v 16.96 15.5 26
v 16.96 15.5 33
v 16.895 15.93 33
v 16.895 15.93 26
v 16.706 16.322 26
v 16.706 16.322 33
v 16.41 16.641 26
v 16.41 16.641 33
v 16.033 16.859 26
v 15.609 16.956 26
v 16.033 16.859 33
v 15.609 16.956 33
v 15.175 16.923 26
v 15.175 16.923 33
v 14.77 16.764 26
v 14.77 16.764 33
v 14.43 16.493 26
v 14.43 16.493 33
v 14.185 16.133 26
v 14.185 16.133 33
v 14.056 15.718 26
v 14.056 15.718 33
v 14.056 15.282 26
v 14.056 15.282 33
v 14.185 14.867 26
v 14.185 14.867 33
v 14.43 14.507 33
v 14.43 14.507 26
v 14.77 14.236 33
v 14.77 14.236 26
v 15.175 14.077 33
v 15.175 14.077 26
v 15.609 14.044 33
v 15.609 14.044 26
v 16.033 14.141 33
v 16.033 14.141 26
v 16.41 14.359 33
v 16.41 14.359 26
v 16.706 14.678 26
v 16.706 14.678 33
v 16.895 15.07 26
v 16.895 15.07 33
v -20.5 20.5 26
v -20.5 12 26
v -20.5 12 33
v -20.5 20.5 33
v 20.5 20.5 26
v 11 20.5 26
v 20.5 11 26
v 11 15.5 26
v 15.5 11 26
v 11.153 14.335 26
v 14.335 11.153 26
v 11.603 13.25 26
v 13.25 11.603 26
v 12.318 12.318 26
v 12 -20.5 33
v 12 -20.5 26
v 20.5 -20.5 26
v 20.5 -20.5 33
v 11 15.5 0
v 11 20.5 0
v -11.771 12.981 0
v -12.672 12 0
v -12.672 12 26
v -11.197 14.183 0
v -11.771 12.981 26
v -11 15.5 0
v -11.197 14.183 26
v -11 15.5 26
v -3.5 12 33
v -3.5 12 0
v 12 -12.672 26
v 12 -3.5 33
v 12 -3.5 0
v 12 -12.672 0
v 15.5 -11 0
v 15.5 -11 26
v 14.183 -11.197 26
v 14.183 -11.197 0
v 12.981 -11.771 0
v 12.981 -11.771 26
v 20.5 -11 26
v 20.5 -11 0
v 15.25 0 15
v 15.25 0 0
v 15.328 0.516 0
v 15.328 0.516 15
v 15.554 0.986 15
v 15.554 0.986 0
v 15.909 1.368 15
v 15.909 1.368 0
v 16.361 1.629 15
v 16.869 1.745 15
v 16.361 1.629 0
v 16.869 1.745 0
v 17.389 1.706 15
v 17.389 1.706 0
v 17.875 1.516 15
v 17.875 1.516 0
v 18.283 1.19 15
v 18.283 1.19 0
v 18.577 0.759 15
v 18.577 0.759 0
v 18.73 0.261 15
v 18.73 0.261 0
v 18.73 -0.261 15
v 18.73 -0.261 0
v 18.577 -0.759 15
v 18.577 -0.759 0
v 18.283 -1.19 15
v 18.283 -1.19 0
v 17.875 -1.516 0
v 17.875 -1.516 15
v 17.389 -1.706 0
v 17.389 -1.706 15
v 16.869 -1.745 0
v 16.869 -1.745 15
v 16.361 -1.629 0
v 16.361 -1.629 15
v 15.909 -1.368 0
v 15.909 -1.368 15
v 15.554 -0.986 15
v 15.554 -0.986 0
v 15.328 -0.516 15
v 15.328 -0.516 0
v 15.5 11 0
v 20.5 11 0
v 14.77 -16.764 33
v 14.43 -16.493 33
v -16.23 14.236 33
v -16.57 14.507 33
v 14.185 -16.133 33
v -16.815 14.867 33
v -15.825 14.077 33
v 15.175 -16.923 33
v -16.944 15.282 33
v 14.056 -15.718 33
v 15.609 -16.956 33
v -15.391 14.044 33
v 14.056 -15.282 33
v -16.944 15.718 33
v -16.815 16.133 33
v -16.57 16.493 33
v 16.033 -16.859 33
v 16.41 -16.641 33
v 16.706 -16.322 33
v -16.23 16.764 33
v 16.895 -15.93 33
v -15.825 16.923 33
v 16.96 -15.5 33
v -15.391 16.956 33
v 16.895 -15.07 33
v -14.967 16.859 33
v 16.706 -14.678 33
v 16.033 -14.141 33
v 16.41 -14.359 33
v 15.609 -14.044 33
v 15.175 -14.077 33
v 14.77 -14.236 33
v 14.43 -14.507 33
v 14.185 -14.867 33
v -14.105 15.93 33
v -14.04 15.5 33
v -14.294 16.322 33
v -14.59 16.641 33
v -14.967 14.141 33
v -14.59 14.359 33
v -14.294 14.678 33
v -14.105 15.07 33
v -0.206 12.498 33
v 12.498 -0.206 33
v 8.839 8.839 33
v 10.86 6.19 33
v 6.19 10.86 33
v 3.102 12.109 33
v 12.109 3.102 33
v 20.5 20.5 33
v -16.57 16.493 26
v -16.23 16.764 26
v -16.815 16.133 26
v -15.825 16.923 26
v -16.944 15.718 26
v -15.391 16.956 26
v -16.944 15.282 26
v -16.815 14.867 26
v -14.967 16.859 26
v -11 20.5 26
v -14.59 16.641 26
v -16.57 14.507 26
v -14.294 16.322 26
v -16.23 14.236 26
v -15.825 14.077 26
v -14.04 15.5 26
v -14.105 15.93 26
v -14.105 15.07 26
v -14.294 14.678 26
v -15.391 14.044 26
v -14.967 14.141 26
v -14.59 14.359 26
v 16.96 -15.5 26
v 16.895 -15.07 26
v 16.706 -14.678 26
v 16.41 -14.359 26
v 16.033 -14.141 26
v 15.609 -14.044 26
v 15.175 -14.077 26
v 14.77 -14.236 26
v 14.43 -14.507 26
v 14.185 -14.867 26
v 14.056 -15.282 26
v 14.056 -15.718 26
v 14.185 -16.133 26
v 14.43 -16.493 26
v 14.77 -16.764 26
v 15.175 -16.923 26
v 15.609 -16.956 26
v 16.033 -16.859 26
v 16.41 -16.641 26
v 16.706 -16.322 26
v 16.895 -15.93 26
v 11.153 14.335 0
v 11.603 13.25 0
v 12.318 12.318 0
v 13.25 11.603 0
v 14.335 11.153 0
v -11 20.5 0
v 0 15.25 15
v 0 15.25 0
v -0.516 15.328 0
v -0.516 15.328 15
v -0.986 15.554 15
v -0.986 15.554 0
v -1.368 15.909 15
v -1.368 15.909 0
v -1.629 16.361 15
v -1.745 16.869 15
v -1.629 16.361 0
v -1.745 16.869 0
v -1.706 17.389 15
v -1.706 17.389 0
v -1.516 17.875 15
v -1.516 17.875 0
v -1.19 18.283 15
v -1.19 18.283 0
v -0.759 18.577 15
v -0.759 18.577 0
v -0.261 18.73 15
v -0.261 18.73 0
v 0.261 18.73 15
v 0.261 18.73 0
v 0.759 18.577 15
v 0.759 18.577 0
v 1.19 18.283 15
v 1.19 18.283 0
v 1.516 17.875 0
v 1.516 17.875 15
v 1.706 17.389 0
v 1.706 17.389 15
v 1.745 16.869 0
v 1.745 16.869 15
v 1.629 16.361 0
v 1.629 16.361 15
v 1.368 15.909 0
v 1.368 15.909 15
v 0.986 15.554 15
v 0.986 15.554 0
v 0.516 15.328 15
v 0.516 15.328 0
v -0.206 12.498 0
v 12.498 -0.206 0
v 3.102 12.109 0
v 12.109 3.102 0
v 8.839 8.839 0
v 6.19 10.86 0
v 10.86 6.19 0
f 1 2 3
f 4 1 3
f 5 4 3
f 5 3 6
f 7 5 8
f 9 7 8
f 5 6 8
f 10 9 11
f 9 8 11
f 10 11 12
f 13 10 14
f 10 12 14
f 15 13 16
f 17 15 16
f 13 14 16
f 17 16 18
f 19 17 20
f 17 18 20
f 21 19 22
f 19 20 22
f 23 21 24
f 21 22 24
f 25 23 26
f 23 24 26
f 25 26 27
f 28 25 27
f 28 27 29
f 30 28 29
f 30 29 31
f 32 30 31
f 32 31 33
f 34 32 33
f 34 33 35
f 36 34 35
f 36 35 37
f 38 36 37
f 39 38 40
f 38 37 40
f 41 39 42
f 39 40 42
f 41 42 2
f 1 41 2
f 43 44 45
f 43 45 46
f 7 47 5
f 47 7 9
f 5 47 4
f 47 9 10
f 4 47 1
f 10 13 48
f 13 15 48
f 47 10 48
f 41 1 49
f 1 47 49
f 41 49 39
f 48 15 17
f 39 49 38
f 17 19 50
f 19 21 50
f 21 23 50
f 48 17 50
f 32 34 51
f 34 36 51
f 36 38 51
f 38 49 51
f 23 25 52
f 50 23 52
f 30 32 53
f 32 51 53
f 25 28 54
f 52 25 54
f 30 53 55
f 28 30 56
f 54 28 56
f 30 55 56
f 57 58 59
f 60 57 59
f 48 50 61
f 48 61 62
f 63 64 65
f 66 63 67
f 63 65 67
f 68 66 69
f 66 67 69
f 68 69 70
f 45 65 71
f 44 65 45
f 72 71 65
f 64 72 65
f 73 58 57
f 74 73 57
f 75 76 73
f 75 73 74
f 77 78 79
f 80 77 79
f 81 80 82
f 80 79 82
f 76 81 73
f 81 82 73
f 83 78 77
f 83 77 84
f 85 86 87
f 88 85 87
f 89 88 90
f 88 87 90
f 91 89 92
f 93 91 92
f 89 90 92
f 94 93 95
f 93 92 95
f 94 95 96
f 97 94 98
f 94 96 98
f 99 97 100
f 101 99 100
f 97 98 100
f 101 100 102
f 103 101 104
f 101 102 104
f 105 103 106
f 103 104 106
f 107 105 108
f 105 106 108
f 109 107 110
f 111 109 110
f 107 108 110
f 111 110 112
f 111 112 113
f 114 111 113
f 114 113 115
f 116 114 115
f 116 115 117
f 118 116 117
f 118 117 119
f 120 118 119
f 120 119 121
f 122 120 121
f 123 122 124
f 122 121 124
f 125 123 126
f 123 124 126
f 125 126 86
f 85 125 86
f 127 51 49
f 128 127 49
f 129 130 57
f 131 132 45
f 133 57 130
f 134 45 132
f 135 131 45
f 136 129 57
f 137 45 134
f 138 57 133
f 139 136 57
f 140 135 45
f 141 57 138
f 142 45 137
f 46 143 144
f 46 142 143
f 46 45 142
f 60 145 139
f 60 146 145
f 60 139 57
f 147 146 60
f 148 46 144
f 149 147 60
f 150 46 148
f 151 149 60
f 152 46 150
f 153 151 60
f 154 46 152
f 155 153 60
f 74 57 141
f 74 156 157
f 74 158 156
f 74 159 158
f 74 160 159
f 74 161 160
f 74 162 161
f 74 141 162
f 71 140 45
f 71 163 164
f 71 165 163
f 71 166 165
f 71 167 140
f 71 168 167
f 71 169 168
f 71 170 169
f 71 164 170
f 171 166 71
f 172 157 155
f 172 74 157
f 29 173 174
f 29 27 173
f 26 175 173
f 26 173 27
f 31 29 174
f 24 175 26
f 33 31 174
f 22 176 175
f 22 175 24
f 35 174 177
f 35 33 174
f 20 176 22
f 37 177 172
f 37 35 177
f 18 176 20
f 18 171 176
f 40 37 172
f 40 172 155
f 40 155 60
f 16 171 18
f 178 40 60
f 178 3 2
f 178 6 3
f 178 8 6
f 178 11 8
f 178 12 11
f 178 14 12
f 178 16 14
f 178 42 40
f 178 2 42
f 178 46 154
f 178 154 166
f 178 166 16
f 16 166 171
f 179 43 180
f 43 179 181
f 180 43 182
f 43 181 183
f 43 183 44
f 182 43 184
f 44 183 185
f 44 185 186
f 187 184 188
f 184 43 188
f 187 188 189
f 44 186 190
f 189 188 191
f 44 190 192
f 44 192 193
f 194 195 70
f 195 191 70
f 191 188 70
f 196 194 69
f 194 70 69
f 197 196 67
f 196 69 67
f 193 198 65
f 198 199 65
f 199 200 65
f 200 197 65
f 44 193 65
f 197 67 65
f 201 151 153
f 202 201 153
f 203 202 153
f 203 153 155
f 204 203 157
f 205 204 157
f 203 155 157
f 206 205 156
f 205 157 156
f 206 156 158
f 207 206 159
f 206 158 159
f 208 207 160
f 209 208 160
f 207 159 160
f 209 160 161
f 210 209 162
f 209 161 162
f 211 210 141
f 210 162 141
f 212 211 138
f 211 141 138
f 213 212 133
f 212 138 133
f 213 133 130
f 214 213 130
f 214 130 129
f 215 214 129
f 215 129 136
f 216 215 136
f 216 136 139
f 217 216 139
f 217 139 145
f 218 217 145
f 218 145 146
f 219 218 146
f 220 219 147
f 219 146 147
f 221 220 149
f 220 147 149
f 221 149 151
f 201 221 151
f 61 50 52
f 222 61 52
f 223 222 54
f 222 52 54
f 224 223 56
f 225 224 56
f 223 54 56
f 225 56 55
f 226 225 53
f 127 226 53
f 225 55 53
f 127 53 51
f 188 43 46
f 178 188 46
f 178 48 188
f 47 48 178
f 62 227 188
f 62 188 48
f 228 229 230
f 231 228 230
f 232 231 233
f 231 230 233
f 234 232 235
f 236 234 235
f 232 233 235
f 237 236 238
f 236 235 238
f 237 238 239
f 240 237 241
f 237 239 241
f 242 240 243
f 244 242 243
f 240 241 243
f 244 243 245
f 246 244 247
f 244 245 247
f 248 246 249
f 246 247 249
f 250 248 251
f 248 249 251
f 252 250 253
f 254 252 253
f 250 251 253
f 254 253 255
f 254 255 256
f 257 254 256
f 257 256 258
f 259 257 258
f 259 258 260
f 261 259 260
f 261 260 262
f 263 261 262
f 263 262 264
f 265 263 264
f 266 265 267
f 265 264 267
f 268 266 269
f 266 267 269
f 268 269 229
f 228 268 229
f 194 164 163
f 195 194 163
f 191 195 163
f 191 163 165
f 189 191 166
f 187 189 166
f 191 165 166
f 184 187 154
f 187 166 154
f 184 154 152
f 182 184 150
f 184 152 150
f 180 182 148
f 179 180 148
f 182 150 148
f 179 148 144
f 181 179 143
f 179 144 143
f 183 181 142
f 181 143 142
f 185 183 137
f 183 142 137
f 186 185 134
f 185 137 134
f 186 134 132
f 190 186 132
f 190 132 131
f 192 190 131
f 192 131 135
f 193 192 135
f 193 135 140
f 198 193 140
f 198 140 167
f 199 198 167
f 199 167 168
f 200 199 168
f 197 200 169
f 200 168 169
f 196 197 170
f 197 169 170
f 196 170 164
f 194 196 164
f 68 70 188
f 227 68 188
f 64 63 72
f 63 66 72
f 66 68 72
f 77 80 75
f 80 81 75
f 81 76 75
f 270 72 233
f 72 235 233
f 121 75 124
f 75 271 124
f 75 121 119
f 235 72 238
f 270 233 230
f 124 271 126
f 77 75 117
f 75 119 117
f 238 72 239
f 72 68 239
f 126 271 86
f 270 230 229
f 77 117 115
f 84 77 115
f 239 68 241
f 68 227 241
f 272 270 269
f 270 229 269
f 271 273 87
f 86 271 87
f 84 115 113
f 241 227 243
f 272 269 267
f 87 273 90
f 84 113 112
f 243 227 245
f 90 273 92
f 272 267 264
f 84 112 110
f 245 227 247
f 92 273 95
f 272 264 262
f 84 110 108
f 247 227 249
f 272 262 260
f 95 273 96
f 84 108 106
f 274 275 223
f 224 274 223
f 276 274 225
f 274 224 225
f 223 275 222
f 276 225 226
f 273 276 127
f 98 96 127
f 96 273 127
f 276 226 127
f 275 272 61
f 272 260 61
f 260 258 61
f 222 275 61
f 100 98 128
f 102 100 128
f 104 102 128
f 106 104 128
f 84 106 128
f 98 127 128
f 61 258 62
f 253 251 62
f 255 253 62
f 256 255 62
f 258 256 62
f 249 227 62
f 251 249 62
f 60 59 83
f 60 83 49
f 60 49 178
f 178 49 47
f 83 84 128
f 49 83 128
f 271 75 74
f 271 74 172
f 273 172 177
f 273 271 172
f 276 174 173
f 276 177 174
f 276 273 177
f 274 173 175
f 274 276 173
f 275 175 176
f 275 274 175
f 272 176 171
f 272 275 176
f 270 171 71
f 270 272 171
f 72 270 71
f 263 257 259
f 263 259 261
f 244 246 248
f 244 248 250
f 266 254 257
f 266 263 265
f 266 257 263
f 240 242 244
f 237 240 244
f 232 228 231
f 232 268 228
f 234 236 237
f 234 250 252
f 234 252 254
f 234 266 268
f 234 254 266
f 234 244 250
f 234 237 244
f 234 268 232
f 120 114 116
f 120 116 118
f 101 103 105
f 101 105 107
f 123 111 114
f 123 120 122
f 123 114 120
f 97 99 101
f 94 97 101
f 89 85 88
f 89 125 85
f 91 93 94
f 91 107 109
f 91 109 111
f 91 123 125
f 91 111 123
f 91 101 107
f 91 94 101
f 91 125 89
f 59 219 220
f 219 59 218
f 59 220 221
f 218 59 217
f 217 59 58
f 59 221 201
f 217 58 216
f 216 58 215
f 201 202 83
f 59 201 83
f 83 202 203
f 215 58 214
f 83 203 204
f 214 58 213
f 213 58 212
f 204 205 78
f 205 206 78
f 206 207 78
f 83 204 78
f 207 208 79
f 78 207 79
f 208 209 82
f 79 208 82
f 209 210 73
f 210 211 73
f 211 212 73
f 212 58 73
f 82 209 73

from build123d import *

# Parameters (mm, degrees)
PAD002_DEPTH          = 40
SKETCH003_W           = 41
SKETCH003_H           = 41
SKETCH003_R           = 12.5
PAD001_DEPTH          = 33
SKETCH004_R           = 1.46
POCKET001_DEPTH       = 7
POCKET002_DEPTH       = 159.43263
POLARPATTERN_COUNT    = 4
SKETCH006_R           = 1.75
POCKET003_DEPTH       = 15
POLARPATTERN001_COUNT = 4


with BuildPart() as removedpard:
    # Sketch007 → Pad002 (new body)
    with BuildSketch(Plane.XY):
        Polygon((-25, 12), (-25, -25), (12, -25), (12, 0), (0, 0), (0, 12), align=None)
    extrude(amount=PAD002_DEPTH)


with BuildPart() as cut:
    # Sketch003 → Pad001 (new body)
    with BuildSketch(Plane.XY):
        Rectangle(SKETCH003_W, SKETCH003_H)
        Circle(SKETCH003_R, mode=Mode.SUBTRACT)
    extrude(amount=PAD001_DEPTH)

    # Sketch004 → Pocket001 (cut)
    with BuildSketch(Plane.XY.offset(33)):
        with Locations((-15.5, 15.5)):
            Circle(SKETCH004_R)
        with Locations((15.5, 15.5)):
            Circle(SKETCH004_R)
        with Locations((15.5, -15.5)):
            Circle(SKETCH004_R)
        with Locations((-15.5, -15.5)):
            Circle(SKETCH004_R)
    extrude(amount=-POCKET001_DEPTH, mode=Mode.SUBTRACT)

    # Sketch005 → Pocket002 (cut, through all)
    with BuildSketch(Plane.XY.offset(26)):
        with BuildLine():
            ThreePointArc((-11, -15.5), (-12.318019, -12.318019), (-15.5, -11))
            Line((-15.5, -11), (-21.5, -11))
            Line((-21.5, -11), (-21.5, -21.5))
            Line((-21.5, -21.5), (-11, -21.5))
            Line((-11, -15.5), (-11, -21.5))
        make_face()
    pocket002 = extrude(amount=-POCKET002_DEPTH, mode=Mode.SUBTRACT)

    # PolarPattern: Pocket002 ×4 about axis
    polarpattern_axis = Axis((0, 0, 26), (0, 0, 1))
    for i in range(1, POLARPATTERN_COUNT):
        add(pocket002.rotate(polarpattern_axis, i * 360 / POLARPATTERN_COUNT), mode=Mode.SUBTRACT)

    # Sketch006 → Pocket003 (cut)
    with BuildSketch(Plane(origin=(0, 0, 0), x_dir=(1, 0, 0), z_dir=(0, 0, -1))):
        with Locations((-17, 0)):
            Circle(SKETCH006_R)
    pocket003 = extrude(amount=-POCKET003_DEPTH, mode=Mode.SUBTRACT)

    # PolarPattern001: Pocket003 ×4 about axis
    polarpattern001_axis = Axis((0, 0, 0), (0, 0, -1))
    for i in range(1, POLARPATTERN001_COUNT):
        add(pocket003.rotate(polarpattern001_axis, i * 360 / POLARPATTERN001_COUNT), mode=Mode.SUBTRACT)

    # Cut: cut removedPard
    add(removedpard.part, mode=Mode.SUBTRACT)


solid = cut.part
